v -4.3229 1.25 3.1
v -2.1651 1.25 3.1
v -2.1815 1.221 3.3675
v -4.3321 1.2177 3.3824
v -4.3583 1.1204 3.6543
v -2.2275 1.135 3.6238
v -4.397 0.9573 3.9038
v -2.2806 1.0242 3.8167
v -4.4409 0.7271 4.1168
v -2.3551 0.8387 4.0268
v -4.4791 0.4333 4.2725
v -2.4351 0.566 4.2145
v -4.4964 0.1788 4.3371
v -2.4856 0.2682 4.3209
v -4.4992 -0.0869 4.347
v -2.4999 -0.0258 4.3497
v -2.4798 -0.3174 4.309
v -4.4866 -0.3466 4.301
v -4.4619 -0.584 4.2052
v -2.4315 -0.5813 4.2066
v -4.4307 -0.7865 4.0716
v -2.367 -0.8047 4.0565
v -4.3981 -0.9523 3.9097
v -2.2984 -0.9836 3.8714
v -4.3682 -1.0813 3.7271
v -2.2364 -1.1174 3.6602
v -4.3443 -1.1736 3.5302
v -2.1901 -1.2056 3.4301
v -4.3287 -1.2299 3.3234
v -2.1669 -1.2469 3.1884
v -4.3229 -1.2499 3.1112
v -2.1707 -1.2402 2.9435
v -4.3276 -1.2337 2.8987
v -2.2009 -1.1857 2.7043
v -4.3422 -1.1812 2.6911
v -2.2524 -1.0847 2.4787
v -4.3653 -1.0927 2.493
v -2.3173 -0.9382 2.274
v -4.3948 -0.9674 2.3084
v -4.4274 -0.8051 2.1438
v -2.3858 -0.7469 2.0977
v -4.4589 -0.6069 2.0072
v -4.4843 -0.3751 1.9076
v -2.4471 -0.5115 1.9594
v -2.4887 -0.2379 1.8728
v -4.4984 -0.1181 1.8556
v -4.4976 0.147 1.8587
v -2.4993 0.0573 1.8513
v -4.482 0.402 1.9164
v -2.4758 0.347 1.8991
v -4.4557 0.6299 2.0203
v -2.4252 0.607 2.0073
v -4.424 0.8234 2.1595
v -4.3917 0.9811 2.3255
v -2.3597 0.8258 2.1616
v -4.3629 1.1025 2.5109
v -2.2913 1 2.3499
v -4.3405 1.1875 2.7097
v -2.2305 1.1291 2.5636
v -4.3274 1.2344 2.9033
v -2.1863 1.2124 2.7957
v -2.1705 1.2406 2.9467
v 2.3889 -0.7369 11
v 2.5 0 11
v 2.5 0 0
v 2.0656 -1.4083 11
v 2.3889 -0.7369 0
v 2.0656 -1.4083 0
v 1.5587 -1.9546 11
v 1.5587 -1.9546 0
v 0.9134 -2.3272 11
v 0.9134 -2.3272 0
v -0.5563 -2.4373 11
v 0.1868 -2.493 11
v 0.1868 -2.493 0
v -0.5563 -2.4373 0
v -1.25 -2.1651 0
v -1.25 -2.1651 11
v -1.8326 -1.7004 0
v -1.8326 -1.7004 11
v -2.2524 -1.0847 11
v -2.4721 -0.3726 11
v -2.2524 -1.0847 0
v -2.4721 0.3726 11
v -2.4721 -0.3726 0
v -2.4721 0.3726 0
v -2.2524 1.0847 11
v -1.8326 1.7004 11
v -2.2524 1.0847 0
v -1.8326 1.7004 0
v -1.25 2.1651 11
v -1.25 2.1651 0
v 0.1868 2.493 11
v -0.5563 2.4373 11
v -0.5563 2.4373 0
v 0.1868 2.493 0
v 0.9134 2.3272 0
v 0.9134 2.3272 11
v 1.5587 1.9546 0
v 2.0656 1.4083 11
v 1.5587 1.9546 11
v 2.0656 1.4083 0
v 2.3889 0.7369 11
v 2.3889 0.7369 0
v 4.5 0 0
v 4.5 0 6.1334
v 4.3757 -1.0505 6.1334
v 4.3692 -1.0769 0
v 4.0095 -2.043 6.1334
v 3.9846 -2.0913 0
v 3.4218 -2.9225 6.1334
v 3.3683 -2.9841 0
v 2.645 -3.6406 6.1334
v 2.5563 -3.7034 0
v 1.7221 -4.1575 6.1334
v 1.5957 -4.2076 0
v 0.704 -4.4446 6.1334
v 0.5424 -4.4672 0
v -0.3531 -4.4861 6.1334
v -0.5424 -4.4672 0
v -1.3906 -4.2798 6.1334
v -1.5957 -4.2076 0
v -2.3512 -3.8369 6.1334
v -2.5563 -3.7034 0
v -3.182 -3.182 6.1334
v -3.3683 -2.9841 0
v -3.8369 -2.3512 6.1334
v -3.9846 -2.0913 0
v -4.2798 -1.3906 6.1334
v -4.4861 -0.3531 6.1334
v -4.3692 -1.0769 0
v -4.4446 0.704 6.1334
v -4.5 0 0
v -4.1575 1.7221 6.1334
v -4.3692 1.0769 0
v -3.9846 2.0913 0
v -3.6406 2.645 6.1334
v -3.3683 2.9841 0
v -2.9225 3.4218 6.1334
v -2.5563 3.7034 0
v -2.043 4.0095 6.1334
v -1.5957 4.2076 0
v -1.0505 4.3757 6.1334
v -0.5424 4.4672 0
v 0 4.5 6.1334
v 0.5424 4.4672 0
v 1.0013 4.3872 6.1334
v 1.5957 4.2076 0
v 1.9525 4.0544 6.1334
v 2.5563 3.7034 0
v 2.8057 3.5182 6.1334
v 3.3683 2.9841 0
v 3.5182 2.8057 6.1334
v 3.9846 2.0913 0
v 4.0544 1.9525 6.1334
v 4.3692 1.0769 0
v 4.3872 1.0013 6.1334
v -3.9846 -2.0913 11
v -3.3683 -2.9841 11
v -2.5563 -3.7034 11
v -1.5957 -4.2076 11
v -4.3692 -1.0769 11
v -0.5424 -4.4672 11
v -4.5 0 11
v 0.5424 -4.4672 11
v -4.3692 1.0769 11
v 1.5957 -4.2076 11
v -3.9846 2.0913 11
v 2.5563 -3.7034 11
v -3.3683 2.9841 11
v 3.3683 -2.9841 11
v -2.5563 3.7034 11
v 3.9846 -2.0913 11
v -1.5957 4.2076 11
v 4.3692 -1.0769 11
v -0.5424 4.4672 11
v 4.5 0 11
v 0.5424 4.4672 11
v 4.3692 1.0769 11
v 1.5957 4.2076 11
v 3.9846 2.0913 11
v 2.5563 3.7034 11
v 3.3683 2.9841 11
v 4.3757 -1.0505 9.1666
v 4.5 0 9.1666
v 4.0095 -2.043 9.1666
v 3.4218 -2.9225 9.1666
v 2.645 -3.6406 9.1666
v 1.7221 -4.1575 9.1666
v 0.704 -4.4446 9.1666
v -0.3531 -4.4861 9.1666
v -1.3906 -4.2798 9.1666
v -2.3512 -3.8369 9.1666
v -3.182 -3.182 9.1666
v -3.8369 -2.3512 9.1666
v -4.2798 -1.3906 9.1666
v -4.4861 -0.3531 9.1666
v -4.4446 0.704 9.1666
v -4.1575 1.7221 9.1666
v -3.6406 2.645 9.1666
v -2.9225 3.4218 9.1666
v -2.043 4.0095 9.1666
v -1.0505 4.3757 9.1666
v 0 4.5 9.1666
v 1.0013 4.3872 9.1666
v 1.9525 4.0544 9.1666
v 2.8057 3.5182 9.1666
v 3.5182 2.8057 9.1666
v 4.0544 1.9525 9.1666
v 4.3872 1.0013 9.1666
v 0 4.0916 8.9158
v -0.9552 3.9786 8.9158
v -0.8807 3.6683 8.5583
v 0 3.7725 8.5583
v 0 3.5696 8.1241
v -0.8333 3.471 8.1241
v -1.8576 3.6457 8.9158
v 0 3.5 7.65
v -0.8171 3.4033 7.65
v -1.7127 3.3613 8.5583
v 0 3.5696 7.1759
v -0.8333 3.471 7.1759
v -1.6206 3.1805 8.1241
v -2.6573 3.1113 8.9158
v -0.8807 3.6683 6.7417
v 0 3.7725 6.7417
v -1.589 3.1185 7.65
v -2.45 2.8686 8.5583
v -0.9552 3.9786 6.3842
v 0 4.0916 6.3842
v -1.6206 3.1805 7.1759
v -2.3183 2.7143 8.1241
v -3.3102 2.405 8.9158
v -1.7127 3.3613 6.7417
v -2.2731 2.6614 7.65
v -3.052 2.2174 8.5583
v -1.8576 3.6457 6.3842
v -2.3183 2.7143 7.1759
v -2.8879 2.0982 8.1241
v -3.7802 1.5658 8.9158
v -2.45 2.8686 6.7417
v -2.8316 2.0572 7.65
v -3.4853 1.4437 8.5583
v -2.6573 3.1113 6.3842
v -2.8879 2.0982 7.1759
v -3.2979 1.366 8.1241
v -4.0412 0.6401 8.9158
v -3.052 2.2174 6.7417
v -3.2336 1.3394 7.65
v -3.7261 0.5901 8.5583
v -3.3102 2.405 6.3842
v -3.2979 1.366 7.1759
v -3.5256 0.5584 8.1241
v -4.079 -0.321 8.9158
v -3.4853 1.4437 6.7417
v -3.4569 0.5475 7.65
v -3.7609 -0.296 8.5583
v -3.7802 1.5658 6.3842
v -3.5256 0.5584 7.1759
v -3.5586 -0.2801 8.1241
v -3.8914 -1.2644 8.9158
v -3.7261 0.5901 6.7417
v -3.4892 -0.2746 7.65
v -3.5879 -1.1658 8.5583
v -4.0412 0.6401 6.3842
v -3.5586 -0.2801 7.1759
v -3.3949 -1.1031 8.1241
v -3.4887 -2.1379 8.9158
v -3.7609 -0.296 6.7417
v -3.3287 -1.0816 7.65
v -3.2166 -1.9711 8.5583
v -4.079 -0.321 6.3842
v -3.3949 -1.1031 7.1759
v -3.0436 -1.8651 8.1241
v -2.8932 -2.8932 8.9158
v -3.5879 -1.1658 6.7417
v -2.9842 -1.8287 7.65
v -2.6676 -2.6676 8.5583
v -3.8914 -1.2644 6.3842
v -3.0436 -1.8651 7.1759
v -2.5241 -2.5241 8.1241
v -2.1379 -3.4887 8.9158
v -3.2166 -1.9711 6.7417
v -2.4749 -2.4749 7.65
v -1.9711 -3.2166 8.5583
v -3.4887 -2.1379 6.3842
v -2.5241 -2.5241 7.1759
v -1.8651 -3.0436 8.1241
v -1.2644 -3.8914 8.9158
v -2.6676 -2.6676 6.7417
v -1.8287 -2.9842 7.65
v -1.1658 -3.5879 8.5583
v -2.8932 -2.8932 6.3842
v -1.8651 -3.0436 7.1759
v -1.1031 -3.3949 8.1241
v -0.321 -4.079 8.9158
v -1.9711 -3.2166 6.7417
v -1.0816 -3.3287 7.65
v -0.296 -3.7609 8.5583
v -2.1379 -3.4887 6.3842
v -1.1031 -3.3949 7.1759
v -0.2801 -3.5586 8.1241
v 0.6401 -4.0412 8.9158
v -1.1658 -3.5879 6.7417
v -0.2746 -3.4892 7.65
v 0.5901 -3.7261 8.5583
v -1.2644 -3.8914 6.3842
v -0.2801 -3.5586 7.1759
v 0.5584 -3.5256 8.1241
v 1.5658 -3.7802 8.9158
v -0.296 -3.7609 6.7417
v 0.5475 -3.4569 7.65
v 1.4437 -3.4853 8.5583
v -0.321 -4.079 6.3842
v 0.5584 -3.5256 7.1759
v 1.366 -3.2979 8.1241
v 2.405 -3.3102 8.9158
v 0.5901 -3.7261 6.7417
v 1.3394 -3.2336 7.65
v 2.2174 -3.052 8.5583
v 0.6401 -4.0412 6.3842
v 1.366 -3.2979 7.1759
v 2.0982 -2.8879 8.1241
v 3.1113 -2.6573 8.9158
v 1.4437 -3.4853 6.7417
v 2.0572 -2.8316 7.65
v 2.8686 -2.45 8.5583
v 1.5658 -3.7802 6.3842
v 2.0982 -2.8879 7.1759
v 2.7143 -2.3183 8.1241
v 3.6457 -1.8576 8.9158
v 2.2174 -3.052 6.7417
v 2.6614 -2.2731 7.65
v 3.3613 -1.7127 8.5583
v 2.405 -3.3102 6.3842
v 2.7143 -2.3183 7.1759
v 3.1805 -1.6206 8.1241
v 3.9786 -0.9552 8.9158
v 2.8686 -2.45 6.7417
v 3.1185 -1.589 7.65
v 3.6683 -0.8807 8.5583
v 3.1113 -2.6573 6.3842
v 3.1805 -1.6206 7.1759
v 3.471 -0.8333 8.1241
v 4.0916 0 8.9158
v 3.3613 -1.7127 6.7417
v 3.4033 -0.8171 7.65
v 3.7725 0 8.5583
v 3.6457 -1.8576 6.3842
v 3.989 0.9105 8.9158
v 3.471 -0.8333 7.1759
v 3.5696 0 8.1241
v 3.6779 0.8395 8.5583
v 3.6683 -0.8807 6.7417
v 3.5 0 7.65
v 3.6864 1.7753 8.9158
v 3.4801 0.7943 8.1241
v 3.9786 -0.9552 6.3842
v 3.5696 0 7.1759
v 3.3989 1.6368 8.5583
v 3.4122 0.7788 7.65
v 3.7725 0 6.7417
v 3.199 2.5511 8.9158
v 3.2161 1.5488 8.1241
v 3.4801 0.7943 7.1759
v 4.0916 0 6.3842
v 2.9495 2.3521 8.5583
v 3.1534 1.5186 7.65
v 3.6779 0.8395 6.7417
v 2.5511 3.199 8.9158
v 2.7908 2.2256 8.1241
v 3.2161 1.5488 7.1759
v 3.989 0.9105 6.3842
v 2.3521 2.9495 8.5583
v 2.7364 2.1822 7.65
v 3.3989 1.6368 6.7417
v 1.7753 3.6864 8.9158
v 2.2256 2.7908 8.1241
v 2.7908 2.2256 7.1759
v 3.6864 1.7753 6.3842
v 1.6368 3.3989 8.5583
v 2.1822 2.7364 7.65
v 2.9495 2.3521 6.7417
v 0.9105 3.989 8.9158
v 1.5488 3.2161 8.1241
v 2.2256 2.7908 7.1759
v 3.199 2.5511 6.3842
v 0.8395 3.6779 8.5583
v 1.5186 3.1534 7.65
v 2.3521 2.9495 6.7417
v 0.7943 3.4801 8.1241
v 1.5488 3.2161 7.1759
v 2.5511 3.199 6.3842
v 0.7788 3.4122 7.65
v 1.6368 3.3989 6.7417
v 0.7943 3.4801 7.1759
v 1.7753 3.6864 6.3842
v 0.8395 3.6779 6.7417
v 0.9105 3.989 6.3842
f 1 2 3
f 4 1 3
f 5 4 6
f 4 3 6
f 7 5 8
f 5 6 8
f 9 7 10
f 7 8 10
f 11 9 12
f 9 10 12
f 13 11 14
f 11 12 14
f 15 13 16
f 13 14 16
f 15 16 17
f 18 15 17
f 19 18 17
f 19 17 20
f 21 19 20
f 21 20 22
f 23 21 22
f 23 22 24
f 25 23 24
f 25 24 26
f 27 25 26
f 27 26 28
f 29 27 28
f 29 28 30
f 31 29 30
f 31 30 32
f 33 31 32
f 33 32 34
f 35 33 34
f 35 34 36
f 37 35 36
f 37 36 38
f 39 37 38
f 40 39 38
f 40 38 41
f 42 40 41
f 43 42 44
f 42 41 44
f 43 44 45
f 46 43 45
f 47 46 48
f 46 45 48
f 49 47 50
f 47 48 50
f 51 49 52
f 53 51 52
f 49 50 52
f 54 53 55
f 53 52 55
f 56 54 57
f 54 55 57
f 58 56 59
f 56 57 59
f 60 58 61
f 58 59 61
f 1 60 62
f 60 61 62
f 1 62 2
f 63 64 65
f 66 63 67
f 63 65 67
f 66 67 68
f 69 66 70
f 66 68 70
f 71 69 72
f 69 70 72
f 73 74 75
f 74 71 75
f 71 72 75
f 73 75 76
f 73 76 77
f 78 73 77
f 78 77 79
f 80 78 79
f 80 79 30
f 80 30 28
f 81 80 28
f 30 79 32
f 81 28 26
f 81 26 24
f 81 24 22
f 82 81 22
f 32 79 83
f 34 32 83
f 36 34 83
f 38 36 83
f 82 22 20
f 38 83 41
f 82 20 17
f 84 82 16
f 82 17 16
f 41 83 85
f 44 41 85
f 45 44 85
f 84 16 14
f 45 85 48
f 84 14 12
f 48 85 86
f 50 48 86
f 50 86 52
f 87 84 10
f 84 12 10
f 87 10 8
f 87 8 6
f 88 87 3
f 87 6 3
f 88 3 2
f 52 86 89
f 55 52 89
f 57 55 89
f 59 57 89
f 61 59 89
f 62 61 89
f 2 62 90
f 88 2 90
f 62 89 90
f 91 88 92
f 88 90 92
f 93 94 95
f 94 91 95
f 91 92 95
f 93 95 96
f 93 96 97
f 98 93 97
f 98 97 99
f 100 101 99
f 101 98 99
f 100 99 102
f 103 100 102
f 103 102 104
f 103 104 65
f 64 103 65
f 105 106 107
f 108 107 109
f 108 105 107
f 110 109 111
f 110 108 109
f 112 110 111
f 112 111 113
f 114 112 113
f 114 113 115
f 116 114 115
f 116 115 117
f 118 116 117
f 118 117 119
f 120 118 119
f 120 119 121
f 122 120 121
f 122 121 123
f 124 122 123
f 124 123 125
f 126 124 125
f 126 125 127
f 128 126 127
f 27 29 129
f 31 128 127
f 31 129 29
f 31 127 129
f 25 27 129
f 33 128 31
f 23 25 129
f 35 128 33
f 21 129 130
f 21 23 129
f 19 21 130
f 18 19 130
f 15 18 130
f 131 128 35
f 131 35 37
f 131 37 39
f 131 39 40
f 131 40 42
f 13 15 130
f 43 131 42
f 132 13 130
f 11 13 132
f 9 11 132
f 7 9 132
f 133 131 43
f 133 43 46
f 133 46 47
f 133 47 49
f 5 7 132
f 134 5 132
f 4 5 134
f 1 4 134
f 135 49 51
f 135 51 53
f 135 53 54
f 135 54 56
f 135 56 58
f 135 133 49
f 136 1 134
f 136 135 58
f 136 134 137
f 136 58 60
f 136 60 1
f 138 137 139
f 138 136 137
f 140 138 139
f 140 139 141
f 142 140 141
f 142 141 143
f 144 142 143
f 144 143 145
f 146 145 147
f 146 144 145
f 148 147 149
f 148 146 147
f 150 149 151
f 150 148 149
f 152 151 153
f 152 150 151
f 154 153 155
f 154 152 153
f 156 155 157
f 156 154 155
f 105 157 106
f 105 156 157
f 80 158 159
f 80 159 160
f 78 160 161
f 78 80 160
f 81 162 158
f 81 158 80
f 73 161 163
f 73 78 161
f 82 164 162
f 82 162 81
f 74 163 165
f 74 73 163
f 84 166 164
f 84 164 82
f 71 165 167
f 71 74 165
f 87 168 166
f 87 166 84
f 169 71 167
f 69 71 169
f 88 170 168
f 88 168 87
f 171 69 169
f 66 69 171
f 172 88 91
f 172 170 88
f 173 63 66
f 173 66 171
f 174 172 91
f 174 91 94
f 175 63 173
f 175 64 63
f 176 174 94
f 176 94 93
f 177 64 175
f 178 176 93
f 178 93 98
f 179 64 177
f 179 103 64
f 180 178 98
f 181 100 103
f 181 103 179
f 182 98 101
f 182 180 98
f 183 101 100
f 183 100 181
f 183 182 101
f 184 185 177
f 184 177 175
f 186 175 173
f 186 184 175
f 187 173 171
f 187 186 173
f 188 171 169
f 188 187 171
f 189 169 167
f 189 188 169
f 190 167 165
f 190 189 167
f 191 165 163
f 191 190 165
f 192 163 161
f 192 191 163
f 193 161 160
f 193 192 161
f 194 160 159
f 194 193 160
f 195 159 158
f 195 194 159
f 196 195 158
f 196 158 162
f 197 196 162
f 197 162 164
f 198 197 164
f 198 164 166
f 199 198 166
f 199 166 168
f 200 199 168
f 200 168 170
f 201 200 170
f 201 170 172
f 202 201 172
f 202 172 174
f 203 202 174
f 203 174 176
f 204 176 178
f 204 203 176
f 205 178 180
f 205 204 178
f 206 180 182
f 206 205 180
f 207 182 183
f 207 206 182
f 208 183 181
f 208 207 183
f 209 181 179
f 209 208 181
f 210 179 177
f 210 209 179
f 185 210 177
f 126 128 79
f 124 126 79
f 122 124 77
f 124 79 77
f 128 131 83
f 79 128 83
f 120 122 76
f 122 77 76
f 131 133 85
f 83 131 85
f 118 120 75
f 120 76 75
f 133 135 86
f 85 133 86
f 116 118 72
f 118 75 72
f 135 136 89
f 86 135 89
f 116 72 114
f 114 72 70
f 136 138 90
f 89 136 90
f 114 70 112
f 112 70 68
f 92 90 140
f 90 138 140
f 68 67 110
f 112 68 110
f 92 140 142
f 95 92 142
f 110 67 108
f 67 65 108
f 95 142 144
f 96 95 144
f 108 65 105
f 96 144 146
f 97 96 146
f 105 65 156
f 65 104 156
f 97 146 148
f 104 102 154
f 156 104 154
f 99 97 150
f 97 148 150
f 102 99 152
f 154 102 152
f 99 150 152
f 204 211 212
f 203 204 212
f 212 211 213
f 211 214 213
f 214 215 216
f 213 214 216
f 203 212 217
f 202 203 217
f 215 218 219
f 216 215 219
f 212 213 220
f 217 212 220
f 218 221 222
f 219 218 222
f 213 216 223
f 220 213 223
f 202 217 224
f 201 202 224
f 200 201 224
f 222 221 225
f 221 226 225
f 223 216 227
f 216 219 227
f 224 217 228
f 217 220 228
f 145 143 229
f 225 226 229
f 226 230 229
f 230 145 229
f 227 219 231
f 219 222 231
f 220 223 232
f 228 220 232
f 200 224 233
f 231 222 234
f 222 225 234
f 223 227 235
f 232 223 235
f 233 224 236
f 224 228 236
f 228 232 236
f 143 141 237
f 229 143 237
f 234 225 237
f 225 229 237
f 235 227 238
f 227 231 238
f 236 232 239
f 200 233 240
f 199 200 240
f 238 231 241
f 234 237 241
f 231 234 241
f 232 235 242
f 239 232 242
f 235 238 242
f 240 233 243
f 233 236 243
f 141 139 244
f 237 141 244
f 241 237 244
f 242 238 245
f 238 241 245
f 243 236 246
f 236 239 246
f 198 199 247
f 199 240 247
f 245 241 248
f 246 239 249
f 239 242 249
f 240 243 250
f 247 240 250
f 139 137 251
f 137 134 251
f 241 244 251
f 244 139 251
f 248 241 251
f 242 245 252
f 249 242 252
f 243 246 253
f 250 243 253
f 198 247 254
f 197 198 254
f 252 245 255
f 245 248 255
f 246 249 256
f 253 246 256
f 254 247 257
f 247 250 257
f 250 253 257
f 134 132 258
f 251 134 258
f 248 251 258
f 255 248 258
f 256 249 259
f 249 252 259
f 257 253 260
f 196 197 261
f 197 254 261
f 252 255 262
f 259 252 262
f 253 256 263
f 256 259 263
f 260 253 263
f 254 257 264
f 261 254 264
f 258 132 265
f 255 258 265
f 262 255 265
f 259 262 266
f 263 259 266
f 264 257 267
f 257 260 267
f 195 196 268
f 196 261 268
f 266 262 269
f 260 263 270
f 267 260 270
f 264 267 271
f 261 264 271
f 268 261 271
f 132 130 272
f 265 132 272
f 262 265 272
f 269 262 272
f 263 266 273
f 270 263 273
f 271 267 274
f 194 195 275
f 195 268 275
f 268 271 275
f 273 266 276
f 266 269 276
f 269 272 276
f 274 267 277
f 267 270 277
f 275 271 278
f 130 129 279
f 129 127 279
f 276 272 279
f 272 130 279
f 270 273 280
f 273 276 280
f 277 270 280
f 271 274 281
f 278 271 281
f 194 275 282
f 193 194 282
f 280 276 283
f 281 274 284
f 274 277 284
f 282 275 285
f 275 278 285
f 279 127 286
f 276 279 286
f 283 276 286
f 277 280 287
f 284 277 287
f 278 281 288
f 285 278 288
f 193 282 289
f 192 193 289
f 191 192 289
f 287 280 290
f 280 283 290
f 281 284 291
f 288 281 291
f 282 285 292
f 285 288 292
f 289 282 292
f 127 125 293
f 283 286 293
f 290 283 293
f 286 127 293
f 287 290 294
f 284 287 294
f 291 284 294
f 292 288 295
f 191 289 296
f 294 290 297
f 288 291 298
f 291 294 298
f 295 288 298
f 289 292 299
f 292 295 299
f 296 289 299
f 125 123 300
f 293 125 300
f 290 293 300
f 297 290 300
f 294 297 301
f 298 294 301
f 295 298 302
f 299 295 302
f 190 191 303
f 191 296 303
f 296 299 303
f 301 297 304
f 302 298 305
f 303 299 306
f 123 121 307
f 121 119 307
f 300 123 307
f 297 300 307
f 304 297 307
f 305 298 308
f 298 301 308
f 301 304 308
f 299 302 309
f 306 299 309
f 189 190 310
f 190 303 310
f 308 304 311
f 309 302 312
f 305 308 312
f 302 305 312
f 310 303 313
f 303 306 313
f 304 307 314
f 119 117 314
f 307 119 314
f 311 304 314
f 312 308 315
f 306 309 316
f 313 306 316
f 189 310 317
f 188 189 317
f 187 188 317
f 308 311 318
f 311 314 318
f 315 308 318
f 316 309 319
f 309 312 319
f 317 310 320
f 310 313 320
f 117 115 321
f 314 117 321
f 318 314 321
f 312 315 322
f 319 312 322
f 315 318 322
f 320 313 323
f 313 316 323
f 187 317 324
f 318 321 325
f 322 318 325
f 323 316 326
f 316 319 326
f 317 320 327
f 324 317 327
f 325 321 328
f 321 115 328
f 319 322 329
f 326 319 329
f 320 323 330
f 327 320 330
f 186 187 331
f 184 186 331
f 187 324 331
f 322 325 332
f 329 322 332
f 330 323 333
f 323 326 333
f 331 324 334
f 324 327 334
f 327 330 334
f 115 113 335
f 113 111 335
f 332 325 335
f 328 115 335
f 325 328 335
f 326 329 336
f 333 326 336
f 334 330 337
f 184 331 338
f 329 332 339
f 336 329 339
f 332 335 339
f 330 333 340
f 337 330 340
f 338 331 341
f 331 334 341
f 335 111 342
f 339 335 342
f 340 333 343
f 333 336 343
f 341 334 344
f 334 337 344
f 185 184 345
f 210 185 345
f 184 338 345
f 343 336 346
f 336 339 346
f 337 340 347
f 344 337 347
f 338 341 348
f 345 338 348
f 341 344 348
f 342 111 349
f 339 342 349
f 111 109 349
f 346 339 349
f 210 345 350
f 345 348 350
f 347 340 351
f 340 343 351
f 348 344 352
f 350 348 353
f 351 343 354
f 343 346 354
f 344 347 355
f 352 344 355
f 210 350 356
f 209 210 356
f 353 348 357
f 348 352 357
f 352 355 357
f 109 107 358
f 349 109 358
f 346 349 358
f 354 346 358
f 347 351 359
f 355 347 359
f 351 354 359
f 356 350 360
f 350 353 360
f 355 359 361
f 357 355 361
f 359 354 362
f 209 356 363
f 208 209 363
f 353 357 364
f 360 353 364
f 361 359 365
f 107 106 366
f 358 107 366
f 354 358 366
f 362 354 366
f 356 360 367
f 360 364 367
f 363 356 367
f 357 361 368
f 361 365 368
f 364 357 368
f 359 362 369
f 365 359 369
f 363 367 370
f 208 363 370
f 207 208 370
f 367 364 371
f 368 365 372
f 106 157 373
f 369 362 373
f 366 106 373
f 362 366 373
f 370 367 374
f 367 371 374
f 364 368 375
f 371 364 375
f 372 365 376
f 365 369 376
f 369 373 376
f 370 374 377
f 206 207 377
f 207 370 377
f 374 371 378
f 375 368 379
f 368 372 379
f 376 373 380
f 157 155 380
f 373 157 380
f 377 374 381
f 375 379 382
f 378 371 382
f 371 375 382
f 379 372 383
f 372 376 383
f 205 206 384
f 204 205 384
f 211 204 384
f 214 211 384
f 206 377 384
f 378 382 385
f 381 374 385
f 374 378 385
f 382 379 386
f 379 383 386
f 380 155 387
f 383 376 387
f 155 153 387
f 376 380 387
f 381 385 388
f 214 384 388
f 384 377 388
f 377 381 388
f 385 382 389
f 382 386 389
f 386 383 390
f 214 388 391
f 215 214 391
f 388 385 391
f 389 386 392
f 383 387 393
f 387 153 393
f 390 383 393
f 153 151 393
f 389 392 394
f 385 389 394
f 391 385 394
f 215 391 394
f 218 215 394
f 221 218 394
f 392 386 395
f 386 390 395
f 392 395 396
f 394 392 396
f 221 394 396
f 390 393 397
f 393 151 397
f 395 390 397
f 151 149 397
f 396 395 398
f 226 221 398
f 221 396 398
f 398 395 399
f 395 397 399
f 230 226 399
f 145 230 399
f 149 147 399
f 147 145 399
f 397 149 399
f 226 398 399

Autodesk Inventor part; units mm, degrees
ref_plane "YZ Plane" through (0, 0, 0) normal (1, 0, 0) x (0, 1, 0)
ref_plane "XZ Plane" through (0, 0, 0) normal (0, 1, 0) x (-1, 0, 0)
ref_plane "XY Plane" through (0, 0, 0) normal (0, 0, 1) x (1, 0, 0)
sketch "Sketch1" plane through (0, 0, 0) normal (0, 0, 1) x (1, 0, 0)
  circle A0 centre (0, 0) radius 4.5
  circle A1 centre (0, 0) radius 2.5
  dimension "d0" = 9
  dimension "d1" = 5
extrude "Extrusion1" add sketch "Sketch1" along normal blind 11
sketch "Sketch2" plane through (0, 0, 0) normal (1, 0, 0) x (0, 1, 0)
  circle A0 centre (5.15, 7.65) radius 1.65
  line L0 (-4.5, 0) -> (4.5, 0) projected
  line L1 (0, 0) -> (0, 16.0894)
  dimension "d7" = 7.65
  dimension "d8" = 5.15
  dimension "d9" = 3.3
revolve "Revolution1" cut sketch "Sketch2" angle 360 about axis through (0, 0, 0) along (0, 0, 1)
sketch "Sketch3" plane through (0, 0, 0) normal (1, 0, 0) x (0, 1, 0)
  circle A0 centre (0, 3.1) radius 1.25
  point P0 (0, 0)
  dimension "d11" = 2.5
  dimension "d12" = 3.1
extrude "Extrusion2" cut sketch "Sketch3" against normal blind 11
thread "Thread1" size "M2.5x0.45" class "6H" standard "ANSI Metric M Profile" full length
properties part number "MK8_Drive_Gear"
